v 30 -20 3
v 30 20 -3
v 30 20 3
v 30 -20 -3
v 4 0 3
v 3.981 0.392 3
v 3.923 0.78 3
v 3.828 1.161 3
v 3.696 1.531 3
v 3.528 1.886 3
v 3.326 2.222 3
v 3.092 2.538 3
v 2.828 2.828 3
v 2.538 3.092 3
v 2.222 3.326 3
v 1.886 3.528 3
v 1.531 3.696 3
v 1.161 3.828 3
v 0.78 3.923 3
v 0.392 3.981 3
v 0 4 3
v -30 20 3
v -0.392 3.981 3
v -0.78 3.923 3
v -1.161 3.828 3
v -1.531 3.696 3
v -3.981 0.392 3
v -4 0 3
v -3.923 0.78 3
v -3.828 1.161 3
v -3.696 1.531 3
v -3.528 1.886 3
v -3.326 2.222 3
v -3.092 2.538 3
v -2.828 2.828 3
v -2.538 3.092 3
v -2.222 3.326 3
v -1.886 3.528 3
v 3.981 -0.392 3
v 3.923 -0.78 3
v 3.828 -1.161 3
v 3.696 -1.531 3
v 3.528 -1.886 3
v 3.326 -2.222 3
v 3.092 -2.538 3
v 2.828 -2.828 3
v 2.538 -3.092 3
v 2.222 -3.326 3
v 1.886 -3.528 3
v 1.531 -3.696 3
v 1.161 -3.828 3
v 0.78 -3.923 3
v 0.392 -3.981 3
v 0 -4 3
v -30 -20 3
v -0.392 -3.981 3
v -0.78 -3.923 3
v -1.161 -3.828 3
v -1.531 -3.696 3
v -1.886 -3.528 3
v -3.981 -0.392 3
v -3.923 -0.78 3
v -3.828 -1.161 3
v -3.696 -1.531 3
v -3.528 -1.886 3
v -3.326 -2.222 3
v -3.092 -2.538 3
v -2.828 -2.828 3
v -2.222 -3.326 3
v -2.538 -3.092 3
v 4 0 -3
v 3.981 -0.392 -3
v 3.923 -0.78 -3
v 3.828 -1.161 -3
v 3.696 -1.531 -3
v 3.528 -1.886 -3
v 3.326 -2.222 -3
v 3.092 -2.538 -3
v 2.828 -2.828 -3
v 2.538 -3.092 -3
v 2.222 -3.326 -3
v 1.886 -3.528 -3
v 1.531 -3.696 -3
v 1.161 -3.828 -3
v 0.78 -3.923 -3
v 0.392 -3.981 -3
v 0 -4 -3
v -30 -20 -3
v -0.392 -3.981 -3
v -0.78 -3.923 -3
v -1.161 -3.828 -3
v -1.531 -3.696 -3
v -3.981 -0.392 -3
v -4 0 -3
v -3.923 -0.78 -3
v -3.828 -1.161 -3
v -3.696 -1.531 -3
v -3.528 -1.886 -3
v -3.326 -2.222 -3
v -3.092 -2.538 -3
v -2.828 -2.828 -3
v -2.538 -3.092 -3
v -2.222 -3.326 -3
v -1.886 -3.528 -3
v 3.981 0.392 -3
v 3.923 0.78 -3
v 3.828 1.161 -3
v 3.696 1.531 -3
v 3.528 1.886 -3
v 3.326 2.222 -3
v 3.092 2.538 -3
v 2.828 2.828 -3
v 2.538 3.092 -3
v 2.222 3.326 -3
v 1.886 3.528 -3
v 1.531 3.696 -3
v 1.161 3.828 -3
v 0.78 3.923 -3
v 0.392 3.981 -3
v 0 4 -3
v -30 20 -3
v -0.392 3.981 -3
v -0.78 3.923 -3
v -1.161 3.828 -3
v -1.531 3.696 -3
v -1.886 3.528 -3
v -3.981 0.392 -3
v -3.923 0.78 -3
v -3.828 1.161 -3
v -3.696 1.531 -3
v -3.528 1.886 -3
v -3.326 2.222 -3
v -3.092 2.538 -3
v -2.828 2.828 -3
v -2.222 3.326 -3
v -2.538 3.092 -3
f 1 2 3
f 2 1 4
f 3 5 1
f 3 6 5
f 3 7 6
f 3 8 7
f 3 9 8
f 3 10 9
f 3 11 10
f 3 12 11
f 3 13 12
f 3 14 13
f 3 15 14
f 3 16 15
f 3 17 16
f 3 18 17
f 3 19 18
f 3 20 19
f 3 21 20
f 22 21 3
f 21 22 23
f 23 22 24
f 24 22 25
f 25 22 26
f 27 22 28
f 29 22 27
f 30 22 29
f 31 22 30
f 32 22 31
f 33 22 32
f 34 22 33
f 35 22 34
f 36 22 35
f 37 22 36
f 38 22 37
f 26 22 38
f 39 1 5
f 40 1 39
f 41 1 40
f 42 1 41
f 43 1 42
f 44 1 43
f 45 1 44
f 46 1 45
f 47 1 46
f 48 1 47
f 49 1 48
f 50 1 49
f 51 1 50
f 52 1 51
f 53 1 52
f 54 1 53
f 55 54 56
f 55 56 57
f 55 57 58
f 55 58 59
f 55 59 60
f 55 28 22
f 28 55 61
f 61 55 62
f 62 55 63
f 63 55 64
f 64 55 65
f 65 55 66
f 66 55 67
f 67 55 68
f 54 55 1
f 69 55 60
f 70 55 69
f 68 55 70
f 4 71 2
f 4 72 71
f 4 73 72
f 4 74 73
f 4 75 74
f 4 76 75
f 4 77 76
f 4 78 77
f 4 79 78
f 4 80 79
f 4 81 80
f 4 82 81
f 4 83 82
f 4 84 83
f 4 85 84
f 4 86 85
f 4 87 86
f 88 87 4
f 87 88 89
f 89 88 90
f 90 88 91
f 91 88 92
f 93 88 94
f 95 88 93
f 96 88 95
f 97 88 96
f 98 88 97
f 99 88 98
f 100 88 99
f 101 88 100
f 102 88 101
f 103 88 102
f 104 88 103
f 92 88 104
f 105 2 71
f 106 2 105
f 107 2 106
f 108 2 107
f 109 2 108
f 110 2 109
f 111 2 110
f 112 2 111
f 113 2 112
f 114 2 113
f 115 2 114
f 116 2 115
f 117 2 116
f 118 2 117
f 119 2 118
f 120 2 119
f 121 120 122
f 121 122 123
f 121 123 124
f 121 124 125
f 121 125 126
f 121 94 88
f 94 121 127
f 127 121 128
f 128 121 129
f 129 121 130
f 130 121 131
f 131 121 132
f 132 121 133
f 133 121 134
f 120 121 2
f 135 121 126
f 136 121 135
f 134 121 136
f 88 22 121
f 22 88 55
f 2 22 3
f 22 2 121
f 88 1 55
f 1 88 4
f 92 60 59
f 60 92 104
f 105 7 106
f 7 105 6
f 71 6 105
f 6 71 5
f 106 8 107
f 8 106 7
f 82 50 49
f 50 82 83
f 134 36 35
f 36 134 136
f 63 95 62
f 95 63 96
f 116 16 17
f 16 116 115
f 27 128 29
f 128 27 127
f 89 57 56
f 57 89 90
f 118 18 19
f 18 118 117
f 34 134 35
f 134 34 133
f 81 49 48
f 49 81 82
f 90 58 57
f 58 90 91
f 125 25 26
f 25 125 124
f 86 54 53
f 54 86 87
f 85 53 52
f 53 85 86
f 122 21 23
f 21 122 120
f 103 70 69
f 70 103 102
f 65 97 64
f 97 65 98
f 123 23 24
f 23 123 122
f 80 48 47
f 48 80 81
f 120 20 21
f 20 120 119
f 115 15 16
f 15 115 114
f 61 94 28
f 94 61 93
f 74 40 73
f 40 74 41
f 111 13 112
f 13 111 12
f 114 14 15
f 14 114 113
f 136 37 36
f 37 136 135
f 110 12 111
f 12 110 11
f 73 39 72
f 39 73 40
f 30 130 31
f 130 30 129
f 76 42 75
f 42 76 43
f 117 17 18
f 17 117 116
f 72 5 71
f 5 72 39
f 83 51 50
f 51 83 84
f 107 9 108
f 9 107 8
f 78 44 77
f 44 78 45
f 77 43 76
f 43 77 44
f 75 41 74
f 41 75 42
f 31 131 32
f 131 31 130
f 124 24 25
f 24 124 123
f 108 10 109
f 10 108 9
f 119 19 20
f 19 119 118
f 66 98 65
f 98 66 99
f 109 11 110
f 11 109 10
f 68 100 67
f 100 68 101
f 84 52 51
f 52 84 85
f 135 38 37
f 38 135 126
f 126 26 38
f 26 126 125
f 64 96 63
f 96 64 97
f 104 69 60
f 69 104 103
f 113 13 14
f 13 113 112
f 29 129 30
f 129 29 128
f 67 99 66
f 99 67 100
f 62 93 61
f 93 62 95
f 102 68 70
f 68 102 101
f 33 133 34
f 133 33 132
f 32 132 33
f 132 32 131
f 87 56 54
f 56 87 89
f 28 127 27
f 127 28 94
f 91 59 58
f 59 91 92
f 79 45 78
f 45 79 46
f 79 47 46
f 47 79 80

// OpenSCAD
// Millimetres; render with: openscad -o part.stl /opt/3d/examples/part.scad
$fn = 64;
difference() {
    cube([60, 40, 6], center=true);
    cylinder(h=8, d=8, center=true);
}
